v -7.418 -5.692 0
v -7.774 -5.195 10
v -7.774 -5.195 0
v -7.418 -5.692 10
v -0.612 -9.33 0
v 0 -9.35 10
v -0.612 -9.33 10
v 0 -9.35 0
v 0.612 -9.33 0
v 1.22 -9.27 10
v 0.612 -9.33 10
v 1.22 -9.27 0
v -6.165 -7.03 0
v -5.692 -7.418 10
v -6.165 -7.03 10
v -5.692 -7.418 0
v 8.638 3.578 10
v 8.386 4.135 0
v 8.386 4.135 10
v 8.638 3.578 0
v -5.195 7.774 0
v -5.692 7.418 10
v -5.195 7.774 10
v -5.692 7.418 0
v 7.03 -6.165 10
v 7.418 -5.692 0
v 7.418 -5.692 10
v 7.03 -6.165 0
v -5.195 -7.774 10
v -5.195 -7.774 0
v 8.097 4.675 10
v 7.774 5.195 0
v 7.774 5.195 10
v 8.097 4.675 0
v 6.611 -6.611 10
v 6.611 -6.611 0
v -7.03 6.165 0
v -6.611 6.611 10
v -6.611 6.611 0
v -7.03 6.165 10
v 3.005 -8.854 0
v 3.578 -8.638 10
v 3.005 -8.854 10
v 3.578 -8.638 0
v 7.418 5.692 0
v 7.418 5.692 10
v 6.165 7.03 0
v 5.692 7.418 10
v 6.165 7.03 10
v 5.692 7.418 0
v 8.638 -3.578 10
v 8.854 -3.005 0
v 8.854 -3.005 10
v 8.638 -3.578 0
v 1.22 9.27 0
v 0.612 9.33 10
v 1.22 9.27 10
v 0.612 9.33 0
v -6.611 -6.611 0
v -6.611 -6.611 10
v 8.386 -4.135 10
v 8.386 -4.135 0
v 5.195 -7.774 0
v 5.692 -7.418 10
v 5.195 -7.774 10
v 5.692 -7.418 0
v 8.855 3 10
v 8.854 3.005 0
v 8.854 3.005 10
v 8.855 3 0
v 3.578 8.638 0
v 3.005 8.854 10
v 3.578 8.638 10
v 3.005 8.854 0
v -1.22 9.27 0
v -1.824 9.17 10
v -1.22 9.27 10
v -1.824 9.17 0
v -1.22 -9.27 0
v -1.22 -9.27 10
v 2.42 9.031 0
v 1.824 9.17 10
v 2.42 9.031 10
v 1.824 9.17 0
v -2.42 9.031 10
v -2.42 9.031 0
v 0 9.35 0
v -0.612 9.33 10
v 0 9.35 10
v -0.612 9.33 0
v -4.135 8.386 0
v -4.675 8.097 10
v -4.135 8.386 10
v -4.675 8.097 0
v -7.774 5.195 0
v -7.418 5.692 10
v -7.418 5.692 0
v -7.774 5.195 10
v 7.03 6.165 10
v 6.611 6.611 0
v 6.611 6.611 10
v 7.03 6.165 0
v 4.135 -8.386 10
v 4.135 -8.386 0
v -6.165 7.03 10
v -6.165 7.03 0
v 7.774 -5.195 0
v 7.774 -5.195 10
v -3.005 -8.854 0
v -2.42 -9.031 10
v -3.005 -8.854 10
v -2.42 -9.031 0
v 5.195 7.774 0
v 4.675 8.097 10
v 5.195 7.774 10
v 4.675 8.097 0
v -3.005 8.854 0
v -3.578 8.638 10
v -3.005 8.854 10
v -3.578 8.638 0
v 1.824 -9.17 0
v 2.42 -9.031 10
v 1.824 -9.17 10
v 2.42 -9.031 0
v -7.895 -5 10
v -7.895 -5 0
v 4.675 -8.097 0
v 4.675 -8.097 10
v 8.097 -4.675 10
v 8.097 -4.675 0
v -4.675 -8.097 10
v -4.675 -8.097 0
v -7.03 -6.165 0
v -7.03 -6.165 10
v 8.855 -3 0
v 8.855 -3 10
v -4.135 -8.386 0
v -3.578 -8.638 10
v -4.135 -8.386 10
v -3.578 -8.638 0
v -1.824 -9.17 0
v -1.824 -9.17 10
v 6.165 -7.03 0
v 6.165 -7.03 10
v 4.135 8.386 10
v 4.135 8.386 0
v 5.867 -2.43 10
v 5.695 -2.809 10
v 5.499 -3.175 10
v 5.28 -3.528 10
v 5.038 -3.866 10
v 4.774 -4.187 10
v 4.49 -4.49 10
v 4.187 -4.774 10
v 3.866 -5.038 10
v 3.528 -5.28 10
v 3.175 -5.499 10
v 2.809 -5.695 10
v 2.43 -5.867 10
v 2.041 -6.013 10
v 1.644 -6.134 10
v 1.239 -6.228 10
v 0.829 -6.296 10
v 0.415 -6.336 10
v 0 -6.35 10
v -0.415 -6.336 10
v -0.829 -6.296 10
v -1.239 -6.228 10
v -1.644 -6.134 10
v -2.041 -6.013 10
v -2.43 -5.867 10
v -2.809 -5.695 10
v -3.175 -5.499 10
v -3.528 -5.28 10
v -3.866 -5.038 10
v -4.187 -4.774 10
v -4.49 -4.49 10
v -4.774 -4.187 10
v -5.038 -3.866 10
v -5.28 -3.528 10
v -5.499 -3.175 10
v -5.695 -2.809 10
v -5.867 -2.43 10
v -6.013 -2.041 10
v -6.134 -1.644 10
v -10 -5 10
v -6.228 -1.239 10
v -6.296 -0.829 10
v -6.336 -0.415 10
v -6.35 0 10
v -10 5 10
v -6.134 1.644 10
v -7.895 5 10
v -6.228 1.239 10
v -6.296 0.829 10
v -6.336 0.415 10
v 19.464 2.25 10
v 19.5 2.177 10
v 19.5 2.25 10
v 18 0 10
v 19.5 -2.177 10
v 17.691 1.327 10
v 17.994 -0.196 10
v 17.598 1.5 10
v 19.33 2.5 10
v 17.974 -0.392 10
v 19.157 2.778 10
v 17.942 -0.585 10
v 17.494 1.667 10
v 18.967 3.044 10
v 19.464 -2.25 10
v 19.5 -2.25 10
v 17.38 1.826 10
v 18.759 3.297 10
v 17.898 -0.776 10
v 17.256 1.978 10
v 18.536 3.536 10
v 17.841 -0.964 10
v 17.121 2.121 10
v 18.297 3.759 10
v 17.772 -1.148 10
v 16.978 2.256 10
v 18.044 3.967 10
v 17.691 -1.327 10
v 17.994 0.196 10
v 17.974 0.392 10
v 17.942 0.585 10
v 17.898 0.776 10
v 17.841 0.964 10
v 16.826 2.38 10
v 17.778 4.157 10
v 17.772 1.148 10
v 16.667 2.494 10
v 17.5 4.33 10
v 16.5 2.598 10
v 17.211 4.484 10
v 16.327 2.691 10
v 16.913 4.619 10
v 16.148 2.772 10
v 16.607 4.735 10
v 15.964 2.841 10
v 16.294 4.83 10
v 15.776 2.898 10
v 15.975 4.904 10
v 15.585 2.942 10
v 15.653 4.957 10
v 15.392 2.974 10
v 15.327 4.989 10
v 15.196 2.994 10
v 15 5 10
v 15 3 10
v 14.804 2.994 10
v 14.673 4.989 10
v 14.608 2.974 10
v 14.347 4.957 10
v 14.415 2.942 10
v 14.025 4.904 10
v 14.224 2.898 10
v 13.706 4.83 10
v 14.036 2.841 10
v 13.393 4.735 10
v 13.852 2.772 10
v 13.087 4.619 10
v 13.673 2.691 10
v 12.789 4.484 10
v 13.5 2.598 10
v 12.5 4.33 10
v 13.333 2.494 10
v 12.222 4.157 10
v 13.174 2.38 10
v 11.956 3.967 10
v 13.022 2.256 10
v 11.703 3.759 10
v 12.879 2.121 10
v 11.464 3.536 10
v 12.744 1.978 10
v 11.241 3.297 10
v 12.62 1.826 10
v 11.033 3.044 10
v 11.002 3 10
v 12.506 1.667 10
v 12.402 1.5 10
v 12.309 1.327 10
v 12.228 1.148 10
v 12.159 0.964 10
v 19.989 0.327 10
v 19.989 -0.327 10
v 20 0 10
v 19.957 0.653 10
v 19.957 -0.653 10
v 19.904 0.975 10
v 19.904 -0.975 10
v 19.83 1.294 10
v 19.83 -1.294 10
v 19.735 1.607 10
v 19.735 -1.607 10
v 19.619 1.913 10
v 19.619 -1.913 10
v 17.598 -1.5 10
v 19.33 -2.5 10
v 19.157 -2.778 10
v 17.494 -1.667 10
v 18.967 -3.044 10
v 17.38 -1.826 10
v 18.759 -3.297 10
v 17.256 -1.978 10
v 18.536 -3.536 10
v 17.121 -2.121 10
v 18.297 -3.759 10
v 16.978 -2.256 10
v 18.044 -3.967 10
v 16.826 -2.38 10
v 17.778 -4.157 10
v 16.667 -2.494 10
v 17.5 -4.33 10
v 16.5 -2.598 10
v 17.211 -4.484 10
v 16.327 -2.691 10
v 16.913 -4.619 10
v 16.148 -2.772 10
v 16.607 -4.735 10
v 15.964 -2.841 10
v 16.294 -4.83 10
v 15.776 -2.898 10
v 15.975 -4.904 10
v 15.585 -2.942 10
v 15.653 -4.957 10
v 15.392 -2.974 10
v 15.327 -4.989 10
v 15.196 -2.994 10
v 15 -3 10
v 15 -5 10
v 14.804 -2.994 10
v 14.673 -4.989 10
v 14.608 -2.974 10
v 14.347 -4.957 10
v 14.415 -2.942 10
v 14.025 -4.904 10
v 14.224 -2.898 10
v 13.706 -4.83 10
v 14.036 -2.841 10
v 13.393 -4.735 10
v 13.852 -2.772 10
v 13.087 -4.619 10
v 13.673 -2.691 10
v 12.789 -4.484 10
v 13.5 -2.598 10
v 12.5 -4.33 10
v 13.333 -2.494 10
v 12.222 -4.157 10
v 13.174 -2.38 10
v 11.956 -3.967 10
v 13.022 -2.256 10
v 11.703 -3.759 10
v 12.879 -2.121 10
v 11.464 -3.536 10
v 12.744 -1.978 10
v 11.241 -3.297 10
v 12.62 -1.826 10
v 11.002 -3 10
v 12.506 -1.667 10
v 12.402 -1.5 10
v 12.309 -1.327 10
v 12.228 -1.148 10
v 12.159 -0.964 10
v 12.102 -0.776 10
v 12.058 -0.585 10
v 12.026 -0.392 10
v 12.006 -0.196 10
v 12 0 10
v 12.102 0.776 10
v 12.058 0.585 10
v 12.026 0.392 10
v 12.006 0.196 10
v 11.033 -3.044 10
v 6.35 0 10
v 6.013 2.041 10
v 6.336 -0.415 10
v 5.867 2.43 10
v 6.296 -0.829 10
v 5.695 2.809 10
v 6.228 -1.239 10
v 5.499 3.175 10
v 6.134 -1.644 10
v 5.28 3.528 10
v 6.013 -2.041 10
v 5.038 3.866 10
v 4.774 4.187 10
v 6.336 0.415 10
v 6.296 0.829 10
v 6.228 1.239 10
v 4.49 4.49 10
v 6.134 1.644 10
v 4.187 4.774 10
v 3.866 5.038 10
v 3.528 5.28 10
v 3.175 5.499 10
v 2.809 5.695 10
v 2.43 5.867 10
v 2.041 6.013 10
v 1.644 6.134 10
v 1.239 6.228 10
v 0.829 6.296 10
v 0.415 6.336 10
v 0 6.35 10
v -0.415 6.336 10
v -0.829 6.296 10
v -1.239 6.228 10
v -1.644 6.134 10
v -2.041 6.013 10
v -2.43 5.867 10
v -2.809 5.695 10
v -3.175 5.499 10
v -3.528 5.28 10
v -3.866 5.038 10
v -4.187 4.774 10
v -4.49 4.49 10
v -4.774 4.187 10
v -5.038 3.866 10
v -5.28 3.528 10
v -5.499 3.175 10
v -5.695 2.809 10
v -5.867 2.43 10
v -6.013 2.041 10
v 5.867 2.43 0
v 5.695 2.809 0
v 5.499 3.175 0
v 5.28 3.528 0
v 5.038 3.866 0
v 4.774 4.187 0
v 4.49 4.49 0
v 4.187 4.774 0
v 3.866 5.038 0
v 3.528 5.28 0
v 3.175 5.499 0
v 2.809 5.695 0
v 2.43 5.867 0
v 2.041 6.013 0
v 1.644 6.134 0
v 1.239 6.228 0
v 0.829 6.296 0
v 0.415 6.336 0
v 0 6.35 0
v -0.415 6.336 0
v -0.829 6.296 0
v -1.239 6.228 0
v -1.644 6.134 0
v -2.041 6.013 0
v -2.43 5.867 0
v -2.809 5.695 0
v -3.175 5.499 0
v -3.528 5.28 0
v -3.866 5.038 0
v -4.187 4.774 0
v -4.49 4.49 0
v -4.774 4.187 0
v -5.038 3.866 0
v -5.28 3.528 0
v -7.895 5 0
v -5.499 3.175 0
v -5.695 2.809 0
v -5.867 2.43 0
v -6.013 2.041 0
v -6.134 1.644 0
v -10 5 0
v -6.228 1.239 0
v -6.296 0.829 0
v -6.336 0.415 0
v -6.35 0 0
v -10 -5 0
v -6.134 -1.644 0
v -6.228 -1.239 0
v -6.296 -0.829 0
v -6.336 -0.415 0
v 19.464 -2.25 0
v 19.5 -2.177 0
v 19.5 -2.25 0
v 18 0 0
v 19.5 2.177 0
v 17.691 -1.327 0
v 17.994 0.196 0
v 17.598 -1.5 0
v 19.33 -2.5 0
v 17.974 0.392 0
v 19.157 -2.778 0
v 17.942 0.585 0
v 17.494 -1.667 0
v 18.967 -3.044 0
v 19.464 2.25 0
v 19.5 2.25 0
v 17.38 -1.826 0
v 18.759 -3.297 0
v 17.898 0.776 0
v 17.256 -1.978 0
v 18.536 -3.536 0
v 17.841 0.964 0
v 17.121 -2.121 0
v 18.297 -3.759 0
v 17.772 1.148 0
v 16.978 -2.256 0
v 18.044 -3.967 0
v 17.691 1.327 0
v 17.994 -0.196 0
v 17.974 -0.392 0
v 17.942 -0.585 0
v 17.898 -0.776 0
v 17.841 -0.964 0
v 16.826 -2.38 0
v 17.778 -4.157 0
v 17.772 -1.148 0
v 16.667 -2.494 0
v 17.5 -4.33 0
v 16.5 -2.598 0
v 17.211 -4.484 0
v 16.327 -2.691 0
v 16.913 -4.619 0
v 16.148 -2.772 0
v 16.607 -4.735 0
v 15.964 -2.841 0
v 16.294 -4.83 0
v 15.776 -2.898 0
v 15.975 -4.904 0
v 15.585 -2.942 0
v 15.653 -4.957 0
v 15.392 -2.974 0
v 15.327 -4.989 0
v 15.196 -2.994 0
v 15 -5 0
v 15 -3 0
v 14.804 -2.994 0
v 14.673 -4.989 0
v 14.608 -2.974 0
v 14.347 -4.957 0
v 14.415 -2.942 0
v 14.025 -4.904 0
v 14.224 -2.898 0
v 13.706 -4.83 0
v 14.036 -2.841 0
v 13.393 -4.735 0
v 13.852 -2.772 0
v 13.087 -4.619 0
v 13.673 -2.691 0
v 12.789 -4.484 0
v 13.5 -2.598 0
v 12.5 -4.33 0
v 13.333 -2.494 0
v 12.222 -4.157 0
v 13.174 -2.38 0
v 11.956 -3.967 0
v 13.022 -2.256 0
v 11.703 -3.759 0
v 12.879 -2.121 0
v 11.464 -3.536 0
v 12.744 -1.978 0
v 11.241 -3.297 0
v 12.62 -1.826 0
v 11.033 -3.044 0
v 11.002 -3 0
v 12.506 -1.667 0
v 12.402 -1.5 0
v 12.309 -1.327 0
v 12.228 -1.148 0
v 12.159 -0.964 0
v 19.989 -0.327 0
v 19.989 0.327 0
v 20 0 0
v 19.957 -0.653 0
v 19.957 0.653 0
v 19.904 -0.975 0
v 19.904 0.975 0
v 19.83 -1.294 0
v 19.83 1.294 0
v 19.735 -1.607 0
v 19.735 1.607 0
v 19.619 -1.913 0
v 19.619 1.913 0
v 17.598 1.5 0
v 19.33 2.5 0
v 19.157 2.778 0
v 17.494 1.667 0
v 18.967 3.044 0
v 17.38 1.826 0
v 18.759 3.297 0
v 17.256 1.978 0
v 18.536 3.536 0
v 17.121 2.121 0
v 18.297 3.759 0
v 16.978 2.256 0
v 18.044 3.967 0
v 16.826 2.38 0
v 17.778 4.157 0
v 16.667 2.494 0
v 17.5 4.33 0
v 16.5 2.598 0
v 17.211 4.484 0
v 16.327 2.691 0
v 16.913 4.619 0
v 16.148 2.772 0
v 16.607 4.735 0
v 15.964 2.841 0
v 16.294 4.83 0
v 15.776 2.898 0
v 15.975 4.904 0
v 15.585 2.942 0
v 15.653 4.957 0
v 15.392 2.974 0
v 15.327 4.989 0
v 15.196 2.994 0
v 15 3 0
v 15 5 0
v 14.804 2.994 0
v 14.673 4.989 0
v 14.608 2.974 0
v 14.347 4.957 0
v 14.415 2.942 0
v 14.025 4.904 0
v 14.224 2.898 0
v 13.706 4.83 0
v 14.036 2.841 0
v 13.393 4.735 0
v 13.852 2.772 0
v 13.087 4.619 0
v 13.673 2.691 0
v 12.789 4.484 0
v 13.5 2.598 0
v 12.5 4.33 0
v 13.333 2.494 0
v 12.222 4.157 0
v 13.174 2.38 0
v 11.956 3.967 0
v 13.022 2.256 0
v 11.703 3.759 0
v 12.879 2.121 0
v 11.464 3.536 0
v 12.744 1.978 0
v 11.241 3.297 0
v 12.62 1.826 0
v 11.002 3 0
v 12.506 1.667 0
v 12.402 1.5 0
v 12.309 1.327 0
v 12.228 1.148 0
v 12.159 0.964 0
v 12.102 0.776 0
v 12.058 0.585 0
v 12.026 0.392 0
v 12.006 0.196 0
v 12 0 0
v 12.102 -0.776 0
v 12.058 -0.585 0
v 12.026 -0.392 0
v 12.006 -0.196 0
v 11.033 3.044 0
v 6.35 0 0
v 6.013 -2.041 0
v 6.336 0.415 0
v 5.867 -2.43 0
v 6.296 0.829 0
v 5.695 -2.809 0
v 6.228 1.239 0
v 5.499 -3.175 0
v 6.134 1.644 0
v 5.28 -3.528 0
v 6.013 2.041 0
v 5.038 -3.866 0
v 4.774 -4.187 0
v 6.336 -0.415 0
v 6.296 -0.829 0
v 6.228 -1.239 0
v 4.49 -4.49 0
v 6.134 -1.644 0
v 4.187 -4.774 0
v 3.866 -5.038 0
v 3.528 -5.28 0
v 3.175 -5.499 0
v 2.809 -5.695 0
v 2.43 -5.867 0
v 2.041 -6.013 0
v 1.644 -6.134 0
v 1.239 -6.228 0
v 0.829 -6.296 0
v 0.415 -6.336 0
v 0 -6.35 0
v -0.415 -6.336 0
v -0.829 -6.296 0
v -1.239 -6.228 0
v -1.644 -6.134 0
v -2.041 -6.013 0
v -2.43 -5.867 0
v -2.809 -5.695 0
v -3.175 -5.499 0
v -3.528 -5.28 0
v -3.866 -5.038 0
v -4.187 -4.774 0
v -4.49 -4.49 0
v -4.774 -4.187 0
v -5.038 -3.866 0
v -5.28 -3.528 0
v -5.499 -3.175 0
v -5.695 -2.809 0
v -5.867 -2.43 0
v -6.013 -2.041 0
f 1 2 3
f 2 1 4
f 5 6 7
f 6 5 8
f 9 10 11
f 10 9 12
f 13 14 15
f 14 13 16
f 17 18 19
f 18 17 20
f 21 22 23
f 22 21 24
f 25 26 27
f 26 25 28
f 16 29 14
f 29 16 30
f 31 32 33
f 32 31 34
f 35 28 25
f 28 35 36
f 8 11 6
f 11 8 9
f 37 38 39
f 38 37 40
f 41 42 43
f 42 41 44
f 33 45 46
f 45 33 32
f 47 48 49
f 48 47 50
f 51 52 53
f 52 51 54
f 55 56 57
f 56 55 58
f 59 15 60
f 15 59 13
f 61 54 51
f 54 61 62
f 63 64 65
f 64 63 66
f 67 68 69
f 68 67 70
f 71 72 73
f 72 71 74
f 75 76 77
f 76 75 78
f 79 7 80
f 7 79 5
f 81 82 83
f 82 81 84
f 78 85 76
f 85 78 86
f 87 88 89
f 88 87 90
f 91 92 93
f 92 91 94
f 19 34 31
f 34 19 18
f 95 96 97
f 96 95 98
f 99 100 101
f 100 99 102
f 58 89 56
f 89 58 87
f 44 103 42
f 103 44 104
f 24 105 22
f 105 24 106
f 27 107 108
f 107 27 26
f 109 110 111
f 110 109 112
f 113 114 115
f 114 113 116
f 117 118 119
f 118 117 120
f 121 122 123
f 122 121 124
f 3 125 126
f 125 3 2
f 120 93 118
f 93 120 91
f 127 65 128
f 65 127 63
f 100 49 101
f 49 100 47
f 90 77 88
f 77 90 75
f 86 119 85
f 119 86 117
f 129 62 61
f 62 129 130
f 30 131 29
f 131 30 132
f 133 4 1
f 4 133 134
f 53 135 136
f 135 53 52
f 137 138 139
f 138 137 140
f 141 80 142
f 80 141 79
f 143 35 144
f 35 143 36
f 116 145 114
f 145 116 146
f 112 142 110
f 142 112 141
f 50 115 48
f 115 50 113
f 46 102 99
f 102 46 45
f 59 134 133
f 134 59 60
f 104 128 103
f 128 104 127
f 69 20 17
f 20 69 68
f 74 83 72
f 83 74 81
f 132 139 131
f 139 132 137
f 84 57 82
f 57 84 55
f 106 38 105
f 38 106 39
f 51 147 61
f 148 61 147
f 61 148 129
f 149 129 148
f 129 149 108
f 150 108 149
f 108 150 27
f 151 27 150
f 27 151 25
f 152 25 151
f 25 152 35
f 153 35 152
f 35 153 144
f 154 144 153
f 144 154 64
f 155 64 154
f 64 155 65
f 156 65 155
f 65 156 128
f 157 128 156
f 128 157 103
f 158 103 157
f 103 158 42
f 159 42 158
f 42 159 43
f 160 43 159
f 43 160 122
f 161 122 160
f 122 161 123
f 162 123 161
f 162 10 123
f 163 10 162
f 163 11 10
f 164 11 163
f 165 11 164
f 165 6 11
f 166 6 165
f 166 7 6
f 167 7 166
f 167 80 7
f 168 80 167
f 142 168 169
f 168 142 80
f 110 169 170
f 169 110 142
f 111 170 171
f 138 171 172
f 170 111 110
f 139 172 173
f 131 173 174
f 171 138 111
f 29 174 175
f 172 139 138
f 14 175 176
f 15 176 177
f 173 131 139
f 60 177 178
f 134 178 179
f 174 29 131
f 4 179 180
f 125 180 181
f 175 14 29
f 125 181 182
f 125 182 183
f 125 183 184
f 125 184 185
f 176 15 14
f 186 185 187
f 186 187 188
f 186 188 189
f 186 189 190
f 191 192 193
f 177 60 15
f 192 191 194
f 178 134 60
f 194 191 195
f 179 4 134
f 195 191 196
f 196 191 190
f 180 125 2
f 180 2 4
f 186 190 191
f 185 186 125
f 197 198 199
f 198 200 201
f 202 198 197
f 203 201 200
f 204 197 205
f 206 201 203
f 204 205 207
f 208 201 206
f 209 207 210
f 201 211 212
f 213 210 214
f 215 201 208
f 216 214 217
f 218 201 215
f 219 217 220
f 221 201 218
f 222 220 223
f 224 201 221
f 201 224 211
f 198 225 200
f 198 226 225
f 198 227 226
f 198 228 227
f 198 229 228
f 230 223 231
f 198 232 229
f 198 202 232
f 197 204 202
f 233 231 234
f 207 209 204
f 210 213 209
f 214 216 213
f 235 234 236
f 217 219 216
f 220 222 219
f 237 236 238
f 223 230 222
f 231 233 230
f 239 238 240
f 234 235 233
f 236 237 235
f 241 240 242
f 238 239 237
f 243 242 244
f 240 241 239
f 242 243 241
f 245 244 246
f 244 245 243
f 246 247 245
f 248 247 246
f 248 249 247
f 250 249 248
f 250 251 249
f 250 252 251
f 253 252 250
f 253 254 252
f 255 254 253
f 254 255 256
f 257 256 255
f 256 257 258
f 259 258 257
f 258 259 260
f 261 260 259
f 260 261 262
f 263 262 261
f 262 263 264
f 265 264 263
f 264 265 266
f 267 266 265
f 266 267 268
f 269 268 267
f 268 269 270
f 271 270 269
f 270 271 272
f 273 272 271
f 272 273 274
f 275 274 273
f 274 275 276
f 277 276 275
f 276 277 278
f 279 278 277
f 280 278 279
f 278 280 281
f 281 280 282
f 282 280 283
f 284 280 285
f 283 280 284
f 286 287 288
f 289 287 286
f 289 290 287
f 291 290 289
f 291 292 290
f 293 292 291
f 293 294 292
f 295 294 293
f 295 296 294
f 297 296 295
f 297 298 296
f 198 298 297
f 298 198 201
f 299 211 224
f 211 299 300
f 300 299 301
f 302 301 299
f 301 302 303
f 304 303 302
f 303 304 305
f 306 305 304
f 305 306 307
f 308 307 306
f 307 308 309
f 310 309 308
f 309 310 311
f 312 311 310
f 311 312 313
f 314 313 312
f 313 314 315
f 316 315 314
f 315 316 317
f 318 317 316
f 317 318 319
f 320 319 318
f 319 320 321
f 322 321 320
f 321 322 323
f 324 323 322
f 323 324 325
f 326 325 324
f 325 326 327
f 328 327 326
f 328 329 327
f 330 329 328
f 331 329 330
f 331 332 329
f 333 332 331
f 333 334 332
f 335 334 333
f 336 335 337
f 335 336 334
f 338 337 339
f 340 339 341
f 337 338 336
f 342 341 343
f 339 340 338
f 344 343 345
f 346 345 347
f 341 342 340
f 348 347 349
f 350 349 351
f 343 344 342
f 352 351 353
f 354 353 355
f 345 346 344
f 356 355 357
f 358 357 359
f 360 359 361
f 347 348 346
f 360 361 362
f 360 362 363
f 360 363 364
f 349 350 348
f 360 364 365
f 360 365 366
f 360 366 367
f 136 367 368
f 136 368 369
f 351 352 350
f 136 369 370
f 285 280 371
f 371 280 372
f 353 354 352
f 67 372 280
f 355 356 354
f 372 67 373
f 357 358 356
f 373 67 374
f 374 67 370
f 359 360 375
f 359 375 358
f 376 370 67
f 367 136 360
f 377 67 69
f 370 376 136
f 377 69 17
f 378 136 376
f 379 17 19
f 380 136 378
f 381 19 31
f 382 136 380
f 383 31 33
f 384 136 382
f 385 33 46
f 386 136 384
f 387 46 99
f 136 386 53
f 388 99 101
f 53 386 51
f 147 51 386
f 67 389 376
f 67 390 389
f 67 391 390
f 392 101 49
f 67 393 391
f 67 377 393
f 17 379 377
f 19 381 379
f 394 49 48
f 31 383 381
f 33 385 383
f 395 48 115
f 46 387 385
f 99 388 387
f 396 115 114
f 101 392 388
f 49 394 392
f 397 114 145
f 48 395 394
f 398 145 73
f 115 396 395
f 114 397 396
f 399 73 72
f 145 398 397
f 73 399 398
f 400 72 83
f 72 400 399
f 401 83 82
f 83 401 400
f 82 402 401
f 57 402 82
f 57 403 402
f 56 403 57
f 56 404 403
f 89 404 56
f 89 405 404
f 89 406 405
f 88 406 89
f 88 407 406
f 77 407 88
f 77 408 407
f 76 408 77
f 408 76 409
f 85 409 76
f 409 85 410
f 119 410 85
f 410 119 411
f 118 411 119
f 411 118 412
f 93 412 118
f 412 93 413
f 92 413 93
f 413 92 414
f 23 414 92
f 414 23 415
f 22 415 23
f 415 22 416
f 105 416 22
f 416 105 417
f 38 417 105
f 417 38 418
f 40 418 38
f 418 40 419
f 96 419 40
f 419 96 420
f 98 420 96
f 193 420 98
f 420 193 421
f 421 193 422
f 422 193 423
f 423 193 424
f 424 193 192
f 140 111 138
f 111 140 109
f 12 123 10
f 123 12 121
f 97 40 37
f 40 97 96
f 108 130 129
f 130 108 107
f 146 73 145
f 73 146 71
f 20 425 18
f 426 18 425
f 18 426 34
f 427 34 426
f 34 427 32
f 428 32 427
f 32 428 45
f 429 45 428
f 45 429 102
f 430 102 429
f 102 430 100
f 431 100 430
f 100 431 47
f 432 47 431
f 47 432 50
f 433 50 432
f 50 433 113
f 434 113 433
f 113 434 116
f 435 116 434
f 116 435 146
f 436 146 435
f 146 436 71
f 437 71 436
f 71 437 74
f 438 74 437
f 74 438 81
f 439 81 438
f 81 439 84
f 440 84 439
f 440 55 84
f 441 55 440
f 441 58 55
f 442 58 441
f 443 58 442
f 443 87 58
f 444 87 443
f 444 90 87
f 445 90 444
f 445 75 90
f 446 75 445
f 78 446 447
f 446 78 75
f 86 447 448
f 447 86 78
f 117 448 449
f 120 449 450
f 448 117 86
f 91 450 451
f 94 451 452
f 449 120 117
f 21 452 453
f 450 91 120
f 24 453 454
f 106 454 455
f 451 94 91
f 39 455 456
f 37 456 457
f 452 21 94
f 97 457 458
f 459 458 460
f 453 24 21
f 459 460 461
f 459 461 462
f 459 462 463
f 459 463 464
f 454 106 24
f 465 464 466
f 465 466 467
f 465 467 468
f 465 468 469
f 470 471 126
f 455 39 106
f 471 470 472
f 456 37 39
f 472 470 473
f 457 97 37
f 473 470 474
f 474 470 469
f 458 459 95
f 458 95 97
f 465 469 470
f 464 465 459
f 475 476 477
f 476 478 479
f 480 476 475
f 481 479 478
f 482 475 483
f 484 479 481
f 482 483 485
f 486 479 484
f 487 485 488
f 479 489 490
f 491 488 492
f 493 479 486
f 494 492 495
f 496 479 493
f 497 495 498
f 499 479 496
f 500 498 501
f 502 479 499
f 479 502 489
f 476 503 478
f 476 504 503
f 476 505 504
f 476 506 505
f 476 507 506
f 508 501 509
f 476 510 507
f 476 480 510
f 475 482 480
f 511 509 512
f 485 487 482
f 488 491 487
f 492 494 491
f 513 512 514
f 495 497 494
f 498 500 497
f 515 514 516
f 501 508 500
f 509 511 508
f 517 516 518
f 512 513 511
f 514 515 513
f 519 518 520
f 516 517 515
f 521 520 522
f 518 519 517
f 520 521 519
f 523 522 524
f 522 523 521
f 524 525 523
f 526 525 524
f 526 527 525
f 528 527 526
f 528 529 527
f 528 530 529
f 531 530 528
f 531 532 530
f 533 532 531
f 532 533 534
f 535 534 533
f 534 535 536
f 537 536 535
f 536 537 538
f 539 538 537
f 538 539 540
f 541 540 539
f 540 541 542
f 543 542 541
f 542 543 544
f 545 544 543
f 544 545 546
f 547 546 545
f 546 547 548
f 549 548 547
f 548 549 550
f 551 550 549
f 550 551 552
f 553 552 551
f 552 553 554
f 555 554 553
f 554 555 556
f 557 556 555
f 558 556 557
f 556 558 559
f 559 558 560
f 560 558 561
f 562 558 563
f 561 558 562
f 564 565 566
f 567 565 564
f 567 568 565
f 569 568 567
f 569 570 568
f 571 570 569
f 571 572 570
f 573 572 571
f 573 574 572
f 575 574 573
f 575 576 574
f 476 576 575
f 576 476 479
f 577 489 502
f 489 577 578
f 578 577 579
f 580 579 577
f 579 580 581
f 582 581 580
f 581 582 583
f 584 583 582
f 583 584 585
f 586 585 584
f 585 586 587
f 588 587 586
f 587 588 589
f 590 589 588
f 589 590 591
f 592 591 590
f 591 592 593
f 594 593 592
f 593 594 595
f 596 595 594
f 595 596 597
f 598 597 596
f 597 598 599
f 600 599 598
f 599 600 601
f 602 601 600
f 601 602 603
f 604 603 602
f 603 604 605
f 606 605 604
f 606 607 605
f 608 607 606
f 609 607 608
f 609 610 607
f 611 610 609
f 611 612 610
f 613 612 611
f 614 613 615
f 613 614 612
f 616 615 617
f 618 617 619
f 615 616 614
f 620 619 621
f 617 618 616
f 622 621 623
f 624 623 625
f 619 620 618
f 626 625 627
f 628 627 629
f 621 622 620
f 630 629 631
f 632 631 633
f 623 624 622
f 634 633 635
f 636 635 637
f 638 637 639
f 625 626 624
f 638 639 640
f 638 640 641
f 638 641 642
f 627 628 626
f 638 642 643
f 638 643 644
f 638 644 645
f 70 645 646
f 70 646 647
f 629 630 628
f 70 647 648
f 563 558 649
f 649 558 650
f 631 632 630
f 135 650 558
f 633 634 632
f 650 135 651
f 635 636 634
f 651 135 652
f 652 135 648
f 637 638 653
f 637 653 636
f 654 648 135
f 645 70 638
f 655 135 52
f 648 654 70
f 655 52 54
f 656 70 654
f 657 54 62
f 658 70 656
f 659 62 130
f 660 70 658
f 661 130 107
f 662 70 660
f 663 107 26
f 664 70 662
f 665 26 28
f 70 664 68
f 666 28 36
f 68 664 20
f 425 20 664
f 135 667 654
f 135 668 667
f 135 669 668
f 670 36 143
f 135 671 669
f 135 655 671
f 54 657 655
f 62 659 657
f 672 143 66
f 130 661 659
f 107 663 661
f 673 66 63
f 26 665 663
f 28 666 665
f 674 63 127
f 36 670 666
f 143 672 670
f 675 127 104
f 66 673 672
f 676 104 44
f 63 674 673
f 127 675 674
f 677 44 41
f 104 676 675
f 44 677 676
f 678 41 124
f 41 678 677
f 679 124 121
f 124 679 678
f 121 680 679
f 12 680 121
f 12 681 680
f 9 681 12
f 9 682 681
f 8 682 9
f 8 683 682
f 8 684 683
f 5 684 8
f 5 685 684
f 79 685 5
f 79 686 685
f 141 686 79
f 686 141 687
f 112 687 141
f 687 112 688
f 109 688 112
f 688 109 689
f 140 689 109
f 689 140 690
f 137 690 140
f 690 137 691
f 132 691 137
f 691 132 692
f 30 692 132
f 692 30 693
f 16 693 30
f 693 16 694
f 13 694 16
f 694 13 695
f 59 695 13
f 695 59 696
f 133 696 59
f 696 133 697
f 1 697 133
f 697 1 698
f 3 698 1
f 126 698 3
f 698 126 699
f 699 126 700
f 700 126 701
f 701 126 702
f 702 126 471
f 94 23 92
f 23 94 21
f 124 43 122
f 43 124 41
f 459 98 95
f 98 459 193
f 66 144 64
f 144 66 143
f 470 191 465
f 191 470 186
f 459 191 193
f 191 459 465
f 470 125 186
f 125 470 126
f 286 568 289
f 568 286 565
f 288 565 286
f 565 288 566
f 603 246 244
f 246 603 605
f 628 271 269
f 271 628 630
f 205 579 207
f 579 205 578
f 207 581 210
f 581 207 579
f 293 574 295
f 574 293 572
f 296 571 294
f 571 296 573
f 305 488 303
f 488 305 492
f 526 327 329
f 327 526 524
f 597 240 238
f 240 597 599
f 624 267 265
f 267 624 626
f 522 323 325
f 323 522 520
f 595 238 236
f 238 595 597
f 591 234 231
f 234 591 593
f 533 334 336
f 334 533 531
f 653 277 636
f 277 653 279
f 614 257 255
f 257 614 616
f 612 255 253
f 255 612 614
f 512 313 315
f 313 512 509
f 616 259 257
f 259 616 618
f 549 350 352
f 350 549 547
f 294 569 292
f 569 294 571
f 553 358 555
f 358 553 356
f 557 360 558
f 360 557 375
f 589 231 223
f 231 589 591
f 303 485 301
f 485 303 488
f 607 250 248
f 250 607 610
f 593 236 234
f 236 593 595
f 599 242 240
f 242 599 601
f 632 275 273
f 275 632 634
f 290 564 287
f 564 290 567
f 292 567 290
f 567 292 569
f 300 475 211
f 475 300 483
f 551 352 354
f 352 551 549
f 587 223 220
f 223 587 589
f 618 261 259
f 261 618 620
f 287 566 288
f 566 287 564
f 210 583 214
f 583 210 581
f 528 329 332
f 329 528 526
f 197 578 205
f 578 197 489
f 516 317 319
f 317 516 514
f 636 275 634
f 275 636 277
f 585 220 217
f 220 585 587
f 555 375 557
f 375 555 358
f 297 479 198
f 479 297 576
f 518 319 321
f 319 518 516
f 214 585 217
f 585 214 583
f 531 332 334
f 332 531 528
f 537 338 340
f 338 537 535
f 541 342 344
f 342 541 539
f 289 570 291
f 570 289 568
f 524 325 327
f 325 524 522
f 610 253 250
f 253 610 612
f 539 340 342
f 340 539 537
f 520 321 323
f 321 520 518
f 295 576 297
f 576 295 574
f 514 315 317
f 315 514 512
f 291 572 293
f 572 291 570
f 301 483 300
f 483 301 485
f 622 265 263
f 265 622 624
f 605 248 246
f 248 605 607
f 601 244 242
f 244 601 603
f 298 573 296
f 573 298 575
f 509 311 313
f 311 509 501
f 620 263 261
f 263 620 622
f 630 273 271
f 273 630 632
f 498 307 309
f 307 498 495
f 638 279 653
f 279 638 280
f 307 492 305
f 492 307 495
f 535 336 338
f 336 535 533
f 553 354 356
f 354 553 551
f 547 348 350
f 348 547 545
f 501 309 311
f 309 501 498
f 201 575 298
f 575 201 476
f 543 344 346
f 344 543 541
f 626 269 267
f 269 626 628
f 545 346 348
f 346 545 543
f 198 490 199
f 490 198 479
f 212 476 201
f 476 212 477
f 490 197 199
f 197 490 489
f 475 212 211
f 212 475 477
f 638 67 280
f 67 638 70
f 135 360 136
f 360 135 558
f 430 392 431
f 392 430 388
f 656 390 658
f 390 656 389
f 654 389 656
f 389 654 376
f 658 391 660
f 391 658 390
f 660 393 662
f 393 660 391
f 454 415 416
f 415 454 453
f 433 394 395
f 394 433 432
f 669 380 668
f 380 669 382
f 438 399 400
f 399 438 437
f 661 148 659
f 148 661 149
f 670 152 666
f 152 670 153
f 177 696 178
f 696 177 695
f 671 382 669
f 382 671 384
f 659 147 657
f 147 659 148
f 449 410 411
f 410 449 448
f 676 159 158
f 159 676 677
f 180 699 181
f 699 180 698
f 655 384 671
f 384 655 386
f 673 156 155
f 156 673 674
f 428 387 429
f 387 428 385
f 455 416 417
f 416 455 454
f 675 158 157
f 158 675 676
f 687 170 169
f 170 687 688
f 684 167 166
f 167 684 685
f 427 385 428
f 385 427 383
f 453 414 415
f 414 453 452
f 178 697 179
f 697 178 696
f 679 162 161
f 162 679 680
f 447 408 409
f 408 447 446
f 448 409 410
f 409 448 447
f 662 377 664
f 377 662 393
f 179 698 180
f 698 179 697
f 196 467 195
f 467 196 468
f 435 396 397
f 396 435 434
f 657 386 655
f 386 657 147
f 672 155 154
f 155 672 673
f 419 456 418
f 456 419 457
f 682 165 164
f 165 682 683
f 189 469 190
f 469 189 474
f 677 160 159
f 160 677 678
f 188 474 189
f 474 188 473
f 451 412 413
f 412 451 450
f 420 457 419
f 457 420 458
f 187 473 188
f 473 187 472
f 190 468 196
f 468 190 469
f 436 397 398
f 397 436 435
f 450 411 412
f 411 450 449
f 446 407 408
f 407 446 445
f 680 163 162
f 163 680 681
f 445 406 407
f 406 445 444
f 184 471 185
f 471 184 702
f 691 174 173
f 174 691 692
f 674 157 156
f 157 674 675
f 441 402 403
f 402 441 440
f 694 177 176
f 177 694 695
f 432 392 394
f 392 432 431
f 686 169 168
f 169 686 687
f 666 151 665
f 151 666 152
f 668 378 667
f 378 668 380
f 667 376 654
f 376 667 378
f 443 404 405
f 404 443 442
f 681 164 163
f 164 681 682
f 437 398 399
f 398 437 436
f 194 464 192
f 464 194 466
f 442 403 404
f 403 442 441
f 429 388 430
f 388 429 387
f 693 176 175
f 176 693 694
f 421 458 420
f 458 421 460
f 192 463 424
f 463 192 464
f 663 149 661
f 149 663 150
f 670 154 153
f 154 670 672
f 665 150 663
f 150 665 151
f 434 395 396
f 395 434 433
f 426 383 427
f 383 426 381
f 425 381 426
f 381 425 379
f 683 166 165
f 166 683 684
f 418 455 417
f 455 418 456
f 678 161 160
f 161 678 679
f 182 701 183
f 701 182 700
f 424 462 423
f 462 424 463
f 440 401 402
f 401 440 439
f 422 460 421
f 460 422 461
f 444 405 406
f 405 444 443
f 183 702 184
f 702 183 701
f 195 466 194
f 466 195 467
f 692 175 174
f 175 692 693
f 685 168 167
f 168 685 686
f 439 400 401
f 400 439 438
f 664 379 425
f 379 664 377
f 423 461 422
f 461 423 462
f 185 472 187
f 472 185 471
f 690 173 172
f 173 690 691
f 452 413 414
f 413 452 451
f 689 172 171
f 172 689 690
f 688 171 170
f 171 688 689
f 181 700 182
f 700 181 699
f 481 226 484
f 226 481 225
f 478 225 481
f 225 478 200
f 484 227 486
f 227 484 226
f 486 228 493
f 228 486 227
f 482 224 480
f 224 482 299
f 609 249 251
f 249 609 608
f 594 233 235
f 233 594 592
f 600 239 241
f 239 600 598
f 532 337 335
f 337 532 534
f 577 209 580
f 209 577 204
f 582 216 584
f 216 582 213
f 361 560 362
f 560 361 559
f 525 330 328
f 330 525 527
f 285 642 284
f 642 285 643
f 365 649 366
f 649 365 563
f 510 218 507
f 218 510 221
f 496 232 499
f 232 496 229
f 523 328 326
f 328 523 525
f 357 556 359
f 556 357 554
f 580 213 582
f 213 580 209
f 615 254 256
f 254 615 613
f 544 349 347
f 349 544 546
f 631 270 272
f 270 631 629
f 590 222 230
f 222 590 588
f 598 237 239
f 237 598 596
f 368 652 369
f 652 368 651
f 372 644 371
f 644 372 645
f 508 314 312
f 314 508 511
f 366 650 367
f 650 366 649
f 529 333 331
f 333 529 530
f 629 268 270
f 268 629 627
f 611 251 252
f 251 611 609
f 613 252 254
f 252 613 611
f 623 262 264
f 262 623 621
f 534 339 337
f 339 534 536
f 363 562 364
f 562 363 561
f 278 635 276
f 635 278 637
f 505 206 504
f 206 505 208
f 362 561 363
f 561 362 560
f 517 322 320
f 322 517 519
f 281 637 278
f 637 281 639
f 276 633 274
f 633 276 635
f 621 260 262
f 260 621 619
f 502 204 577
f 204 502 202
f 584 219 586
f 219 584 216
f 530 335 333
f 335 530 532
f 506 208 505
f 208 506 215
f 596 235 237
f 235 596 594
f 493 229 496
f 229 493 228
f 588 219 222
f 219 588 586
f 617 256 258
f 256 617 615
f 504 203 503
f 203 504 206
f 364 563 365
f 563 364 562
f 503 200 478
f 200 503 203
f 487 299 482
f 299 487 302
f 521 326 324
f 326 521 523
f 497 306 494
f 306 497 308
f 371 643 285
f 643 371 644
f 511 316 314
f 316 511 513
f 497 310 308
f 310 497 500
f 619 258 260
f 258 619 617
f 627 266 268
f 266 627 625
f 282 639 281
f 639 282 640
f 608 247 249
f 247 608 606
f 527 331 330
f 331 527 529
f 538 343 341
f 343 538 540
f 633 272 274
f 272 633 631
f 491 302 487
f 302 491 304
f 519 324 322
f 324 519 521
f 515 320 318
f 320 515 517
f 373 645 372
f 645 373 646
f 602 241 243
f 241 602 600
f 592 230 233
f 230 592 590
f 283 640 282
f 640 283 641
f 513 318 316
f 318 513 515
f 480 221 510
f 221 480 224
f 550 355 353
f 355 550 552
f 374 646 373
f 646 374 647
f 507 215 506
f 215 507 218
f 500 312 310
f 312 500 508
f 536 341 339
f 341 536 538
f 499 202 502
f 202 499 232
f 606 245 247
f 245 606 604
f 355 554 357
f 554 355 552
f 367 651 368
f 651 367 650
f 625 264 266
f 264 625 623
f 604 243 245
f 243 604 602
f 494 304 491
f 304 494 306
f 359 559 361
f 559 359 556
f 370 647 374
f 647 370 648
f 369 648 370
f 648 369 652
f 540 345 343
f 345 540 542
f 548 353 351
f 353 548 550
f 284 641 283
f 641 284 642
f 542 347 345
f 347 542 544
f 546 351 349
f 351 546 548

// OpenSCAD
// Snap-on tubing clip for 12.7 mm stand rod
// Print orientation: flat on bed, builds upward in +Z

$fn = 96;

// ---- Dimensions (mm) ----
stand_d      = 12.7;  // stand rod diameter
stand_w      = 3;     // stand ring wall
stand_od     = stand_d + 2 * stand_w;  // 18.7 outer diameter
stand_open   = 10;    // stand opening width (-X side)

tube_d       = 6;     // tubing inner diameter
tube_w       = 2;     // tubing wall
tube_od      = tube_d + 2 * tube_w;    // 10 outer diameter
tube_x       = 15;    // tubing ring centre X
tube_open    = 4.5;   // tubing opening width (+X side)

bridge_x0    = 8;     // bridge start X
bridge_x1    = 12;    // bridge end X
bridge_w     = 6;     // bridge width (Y)

eps          = 0.5;   // cutter overshoot

// ---- Model ----
difference() {
    union() {
        // Stand ring
        cylinder(d = stand_od, h = 10);
        translate([-stand_open, -stand_open/2, 0])
            cube([stand_open, stand_open, 10]);

        // Tubing ring
        translate([tube_x, 0, 0])
            cylinder(d = tube_od, h = 10);
        translate([tube_x, -tube_open/2, 0])
            cube([tube_open, tube_open, 10]);

        // Bridge
        translate([bridge_x0, -bridge_w/2, 0])
            cube([bridge_x1 - bridge_x0, bridge_w, 10]);
    }

    // Stand rod hole
    translate([0, 0, -eps])
        cylinder(d = stand_d, h = 10 + 2 * eps);

    // Tubing hole
    translate([tube_x, 0, -eps])
        cylinder(d = tube_d, h = 10 + 2 * eps);
}
